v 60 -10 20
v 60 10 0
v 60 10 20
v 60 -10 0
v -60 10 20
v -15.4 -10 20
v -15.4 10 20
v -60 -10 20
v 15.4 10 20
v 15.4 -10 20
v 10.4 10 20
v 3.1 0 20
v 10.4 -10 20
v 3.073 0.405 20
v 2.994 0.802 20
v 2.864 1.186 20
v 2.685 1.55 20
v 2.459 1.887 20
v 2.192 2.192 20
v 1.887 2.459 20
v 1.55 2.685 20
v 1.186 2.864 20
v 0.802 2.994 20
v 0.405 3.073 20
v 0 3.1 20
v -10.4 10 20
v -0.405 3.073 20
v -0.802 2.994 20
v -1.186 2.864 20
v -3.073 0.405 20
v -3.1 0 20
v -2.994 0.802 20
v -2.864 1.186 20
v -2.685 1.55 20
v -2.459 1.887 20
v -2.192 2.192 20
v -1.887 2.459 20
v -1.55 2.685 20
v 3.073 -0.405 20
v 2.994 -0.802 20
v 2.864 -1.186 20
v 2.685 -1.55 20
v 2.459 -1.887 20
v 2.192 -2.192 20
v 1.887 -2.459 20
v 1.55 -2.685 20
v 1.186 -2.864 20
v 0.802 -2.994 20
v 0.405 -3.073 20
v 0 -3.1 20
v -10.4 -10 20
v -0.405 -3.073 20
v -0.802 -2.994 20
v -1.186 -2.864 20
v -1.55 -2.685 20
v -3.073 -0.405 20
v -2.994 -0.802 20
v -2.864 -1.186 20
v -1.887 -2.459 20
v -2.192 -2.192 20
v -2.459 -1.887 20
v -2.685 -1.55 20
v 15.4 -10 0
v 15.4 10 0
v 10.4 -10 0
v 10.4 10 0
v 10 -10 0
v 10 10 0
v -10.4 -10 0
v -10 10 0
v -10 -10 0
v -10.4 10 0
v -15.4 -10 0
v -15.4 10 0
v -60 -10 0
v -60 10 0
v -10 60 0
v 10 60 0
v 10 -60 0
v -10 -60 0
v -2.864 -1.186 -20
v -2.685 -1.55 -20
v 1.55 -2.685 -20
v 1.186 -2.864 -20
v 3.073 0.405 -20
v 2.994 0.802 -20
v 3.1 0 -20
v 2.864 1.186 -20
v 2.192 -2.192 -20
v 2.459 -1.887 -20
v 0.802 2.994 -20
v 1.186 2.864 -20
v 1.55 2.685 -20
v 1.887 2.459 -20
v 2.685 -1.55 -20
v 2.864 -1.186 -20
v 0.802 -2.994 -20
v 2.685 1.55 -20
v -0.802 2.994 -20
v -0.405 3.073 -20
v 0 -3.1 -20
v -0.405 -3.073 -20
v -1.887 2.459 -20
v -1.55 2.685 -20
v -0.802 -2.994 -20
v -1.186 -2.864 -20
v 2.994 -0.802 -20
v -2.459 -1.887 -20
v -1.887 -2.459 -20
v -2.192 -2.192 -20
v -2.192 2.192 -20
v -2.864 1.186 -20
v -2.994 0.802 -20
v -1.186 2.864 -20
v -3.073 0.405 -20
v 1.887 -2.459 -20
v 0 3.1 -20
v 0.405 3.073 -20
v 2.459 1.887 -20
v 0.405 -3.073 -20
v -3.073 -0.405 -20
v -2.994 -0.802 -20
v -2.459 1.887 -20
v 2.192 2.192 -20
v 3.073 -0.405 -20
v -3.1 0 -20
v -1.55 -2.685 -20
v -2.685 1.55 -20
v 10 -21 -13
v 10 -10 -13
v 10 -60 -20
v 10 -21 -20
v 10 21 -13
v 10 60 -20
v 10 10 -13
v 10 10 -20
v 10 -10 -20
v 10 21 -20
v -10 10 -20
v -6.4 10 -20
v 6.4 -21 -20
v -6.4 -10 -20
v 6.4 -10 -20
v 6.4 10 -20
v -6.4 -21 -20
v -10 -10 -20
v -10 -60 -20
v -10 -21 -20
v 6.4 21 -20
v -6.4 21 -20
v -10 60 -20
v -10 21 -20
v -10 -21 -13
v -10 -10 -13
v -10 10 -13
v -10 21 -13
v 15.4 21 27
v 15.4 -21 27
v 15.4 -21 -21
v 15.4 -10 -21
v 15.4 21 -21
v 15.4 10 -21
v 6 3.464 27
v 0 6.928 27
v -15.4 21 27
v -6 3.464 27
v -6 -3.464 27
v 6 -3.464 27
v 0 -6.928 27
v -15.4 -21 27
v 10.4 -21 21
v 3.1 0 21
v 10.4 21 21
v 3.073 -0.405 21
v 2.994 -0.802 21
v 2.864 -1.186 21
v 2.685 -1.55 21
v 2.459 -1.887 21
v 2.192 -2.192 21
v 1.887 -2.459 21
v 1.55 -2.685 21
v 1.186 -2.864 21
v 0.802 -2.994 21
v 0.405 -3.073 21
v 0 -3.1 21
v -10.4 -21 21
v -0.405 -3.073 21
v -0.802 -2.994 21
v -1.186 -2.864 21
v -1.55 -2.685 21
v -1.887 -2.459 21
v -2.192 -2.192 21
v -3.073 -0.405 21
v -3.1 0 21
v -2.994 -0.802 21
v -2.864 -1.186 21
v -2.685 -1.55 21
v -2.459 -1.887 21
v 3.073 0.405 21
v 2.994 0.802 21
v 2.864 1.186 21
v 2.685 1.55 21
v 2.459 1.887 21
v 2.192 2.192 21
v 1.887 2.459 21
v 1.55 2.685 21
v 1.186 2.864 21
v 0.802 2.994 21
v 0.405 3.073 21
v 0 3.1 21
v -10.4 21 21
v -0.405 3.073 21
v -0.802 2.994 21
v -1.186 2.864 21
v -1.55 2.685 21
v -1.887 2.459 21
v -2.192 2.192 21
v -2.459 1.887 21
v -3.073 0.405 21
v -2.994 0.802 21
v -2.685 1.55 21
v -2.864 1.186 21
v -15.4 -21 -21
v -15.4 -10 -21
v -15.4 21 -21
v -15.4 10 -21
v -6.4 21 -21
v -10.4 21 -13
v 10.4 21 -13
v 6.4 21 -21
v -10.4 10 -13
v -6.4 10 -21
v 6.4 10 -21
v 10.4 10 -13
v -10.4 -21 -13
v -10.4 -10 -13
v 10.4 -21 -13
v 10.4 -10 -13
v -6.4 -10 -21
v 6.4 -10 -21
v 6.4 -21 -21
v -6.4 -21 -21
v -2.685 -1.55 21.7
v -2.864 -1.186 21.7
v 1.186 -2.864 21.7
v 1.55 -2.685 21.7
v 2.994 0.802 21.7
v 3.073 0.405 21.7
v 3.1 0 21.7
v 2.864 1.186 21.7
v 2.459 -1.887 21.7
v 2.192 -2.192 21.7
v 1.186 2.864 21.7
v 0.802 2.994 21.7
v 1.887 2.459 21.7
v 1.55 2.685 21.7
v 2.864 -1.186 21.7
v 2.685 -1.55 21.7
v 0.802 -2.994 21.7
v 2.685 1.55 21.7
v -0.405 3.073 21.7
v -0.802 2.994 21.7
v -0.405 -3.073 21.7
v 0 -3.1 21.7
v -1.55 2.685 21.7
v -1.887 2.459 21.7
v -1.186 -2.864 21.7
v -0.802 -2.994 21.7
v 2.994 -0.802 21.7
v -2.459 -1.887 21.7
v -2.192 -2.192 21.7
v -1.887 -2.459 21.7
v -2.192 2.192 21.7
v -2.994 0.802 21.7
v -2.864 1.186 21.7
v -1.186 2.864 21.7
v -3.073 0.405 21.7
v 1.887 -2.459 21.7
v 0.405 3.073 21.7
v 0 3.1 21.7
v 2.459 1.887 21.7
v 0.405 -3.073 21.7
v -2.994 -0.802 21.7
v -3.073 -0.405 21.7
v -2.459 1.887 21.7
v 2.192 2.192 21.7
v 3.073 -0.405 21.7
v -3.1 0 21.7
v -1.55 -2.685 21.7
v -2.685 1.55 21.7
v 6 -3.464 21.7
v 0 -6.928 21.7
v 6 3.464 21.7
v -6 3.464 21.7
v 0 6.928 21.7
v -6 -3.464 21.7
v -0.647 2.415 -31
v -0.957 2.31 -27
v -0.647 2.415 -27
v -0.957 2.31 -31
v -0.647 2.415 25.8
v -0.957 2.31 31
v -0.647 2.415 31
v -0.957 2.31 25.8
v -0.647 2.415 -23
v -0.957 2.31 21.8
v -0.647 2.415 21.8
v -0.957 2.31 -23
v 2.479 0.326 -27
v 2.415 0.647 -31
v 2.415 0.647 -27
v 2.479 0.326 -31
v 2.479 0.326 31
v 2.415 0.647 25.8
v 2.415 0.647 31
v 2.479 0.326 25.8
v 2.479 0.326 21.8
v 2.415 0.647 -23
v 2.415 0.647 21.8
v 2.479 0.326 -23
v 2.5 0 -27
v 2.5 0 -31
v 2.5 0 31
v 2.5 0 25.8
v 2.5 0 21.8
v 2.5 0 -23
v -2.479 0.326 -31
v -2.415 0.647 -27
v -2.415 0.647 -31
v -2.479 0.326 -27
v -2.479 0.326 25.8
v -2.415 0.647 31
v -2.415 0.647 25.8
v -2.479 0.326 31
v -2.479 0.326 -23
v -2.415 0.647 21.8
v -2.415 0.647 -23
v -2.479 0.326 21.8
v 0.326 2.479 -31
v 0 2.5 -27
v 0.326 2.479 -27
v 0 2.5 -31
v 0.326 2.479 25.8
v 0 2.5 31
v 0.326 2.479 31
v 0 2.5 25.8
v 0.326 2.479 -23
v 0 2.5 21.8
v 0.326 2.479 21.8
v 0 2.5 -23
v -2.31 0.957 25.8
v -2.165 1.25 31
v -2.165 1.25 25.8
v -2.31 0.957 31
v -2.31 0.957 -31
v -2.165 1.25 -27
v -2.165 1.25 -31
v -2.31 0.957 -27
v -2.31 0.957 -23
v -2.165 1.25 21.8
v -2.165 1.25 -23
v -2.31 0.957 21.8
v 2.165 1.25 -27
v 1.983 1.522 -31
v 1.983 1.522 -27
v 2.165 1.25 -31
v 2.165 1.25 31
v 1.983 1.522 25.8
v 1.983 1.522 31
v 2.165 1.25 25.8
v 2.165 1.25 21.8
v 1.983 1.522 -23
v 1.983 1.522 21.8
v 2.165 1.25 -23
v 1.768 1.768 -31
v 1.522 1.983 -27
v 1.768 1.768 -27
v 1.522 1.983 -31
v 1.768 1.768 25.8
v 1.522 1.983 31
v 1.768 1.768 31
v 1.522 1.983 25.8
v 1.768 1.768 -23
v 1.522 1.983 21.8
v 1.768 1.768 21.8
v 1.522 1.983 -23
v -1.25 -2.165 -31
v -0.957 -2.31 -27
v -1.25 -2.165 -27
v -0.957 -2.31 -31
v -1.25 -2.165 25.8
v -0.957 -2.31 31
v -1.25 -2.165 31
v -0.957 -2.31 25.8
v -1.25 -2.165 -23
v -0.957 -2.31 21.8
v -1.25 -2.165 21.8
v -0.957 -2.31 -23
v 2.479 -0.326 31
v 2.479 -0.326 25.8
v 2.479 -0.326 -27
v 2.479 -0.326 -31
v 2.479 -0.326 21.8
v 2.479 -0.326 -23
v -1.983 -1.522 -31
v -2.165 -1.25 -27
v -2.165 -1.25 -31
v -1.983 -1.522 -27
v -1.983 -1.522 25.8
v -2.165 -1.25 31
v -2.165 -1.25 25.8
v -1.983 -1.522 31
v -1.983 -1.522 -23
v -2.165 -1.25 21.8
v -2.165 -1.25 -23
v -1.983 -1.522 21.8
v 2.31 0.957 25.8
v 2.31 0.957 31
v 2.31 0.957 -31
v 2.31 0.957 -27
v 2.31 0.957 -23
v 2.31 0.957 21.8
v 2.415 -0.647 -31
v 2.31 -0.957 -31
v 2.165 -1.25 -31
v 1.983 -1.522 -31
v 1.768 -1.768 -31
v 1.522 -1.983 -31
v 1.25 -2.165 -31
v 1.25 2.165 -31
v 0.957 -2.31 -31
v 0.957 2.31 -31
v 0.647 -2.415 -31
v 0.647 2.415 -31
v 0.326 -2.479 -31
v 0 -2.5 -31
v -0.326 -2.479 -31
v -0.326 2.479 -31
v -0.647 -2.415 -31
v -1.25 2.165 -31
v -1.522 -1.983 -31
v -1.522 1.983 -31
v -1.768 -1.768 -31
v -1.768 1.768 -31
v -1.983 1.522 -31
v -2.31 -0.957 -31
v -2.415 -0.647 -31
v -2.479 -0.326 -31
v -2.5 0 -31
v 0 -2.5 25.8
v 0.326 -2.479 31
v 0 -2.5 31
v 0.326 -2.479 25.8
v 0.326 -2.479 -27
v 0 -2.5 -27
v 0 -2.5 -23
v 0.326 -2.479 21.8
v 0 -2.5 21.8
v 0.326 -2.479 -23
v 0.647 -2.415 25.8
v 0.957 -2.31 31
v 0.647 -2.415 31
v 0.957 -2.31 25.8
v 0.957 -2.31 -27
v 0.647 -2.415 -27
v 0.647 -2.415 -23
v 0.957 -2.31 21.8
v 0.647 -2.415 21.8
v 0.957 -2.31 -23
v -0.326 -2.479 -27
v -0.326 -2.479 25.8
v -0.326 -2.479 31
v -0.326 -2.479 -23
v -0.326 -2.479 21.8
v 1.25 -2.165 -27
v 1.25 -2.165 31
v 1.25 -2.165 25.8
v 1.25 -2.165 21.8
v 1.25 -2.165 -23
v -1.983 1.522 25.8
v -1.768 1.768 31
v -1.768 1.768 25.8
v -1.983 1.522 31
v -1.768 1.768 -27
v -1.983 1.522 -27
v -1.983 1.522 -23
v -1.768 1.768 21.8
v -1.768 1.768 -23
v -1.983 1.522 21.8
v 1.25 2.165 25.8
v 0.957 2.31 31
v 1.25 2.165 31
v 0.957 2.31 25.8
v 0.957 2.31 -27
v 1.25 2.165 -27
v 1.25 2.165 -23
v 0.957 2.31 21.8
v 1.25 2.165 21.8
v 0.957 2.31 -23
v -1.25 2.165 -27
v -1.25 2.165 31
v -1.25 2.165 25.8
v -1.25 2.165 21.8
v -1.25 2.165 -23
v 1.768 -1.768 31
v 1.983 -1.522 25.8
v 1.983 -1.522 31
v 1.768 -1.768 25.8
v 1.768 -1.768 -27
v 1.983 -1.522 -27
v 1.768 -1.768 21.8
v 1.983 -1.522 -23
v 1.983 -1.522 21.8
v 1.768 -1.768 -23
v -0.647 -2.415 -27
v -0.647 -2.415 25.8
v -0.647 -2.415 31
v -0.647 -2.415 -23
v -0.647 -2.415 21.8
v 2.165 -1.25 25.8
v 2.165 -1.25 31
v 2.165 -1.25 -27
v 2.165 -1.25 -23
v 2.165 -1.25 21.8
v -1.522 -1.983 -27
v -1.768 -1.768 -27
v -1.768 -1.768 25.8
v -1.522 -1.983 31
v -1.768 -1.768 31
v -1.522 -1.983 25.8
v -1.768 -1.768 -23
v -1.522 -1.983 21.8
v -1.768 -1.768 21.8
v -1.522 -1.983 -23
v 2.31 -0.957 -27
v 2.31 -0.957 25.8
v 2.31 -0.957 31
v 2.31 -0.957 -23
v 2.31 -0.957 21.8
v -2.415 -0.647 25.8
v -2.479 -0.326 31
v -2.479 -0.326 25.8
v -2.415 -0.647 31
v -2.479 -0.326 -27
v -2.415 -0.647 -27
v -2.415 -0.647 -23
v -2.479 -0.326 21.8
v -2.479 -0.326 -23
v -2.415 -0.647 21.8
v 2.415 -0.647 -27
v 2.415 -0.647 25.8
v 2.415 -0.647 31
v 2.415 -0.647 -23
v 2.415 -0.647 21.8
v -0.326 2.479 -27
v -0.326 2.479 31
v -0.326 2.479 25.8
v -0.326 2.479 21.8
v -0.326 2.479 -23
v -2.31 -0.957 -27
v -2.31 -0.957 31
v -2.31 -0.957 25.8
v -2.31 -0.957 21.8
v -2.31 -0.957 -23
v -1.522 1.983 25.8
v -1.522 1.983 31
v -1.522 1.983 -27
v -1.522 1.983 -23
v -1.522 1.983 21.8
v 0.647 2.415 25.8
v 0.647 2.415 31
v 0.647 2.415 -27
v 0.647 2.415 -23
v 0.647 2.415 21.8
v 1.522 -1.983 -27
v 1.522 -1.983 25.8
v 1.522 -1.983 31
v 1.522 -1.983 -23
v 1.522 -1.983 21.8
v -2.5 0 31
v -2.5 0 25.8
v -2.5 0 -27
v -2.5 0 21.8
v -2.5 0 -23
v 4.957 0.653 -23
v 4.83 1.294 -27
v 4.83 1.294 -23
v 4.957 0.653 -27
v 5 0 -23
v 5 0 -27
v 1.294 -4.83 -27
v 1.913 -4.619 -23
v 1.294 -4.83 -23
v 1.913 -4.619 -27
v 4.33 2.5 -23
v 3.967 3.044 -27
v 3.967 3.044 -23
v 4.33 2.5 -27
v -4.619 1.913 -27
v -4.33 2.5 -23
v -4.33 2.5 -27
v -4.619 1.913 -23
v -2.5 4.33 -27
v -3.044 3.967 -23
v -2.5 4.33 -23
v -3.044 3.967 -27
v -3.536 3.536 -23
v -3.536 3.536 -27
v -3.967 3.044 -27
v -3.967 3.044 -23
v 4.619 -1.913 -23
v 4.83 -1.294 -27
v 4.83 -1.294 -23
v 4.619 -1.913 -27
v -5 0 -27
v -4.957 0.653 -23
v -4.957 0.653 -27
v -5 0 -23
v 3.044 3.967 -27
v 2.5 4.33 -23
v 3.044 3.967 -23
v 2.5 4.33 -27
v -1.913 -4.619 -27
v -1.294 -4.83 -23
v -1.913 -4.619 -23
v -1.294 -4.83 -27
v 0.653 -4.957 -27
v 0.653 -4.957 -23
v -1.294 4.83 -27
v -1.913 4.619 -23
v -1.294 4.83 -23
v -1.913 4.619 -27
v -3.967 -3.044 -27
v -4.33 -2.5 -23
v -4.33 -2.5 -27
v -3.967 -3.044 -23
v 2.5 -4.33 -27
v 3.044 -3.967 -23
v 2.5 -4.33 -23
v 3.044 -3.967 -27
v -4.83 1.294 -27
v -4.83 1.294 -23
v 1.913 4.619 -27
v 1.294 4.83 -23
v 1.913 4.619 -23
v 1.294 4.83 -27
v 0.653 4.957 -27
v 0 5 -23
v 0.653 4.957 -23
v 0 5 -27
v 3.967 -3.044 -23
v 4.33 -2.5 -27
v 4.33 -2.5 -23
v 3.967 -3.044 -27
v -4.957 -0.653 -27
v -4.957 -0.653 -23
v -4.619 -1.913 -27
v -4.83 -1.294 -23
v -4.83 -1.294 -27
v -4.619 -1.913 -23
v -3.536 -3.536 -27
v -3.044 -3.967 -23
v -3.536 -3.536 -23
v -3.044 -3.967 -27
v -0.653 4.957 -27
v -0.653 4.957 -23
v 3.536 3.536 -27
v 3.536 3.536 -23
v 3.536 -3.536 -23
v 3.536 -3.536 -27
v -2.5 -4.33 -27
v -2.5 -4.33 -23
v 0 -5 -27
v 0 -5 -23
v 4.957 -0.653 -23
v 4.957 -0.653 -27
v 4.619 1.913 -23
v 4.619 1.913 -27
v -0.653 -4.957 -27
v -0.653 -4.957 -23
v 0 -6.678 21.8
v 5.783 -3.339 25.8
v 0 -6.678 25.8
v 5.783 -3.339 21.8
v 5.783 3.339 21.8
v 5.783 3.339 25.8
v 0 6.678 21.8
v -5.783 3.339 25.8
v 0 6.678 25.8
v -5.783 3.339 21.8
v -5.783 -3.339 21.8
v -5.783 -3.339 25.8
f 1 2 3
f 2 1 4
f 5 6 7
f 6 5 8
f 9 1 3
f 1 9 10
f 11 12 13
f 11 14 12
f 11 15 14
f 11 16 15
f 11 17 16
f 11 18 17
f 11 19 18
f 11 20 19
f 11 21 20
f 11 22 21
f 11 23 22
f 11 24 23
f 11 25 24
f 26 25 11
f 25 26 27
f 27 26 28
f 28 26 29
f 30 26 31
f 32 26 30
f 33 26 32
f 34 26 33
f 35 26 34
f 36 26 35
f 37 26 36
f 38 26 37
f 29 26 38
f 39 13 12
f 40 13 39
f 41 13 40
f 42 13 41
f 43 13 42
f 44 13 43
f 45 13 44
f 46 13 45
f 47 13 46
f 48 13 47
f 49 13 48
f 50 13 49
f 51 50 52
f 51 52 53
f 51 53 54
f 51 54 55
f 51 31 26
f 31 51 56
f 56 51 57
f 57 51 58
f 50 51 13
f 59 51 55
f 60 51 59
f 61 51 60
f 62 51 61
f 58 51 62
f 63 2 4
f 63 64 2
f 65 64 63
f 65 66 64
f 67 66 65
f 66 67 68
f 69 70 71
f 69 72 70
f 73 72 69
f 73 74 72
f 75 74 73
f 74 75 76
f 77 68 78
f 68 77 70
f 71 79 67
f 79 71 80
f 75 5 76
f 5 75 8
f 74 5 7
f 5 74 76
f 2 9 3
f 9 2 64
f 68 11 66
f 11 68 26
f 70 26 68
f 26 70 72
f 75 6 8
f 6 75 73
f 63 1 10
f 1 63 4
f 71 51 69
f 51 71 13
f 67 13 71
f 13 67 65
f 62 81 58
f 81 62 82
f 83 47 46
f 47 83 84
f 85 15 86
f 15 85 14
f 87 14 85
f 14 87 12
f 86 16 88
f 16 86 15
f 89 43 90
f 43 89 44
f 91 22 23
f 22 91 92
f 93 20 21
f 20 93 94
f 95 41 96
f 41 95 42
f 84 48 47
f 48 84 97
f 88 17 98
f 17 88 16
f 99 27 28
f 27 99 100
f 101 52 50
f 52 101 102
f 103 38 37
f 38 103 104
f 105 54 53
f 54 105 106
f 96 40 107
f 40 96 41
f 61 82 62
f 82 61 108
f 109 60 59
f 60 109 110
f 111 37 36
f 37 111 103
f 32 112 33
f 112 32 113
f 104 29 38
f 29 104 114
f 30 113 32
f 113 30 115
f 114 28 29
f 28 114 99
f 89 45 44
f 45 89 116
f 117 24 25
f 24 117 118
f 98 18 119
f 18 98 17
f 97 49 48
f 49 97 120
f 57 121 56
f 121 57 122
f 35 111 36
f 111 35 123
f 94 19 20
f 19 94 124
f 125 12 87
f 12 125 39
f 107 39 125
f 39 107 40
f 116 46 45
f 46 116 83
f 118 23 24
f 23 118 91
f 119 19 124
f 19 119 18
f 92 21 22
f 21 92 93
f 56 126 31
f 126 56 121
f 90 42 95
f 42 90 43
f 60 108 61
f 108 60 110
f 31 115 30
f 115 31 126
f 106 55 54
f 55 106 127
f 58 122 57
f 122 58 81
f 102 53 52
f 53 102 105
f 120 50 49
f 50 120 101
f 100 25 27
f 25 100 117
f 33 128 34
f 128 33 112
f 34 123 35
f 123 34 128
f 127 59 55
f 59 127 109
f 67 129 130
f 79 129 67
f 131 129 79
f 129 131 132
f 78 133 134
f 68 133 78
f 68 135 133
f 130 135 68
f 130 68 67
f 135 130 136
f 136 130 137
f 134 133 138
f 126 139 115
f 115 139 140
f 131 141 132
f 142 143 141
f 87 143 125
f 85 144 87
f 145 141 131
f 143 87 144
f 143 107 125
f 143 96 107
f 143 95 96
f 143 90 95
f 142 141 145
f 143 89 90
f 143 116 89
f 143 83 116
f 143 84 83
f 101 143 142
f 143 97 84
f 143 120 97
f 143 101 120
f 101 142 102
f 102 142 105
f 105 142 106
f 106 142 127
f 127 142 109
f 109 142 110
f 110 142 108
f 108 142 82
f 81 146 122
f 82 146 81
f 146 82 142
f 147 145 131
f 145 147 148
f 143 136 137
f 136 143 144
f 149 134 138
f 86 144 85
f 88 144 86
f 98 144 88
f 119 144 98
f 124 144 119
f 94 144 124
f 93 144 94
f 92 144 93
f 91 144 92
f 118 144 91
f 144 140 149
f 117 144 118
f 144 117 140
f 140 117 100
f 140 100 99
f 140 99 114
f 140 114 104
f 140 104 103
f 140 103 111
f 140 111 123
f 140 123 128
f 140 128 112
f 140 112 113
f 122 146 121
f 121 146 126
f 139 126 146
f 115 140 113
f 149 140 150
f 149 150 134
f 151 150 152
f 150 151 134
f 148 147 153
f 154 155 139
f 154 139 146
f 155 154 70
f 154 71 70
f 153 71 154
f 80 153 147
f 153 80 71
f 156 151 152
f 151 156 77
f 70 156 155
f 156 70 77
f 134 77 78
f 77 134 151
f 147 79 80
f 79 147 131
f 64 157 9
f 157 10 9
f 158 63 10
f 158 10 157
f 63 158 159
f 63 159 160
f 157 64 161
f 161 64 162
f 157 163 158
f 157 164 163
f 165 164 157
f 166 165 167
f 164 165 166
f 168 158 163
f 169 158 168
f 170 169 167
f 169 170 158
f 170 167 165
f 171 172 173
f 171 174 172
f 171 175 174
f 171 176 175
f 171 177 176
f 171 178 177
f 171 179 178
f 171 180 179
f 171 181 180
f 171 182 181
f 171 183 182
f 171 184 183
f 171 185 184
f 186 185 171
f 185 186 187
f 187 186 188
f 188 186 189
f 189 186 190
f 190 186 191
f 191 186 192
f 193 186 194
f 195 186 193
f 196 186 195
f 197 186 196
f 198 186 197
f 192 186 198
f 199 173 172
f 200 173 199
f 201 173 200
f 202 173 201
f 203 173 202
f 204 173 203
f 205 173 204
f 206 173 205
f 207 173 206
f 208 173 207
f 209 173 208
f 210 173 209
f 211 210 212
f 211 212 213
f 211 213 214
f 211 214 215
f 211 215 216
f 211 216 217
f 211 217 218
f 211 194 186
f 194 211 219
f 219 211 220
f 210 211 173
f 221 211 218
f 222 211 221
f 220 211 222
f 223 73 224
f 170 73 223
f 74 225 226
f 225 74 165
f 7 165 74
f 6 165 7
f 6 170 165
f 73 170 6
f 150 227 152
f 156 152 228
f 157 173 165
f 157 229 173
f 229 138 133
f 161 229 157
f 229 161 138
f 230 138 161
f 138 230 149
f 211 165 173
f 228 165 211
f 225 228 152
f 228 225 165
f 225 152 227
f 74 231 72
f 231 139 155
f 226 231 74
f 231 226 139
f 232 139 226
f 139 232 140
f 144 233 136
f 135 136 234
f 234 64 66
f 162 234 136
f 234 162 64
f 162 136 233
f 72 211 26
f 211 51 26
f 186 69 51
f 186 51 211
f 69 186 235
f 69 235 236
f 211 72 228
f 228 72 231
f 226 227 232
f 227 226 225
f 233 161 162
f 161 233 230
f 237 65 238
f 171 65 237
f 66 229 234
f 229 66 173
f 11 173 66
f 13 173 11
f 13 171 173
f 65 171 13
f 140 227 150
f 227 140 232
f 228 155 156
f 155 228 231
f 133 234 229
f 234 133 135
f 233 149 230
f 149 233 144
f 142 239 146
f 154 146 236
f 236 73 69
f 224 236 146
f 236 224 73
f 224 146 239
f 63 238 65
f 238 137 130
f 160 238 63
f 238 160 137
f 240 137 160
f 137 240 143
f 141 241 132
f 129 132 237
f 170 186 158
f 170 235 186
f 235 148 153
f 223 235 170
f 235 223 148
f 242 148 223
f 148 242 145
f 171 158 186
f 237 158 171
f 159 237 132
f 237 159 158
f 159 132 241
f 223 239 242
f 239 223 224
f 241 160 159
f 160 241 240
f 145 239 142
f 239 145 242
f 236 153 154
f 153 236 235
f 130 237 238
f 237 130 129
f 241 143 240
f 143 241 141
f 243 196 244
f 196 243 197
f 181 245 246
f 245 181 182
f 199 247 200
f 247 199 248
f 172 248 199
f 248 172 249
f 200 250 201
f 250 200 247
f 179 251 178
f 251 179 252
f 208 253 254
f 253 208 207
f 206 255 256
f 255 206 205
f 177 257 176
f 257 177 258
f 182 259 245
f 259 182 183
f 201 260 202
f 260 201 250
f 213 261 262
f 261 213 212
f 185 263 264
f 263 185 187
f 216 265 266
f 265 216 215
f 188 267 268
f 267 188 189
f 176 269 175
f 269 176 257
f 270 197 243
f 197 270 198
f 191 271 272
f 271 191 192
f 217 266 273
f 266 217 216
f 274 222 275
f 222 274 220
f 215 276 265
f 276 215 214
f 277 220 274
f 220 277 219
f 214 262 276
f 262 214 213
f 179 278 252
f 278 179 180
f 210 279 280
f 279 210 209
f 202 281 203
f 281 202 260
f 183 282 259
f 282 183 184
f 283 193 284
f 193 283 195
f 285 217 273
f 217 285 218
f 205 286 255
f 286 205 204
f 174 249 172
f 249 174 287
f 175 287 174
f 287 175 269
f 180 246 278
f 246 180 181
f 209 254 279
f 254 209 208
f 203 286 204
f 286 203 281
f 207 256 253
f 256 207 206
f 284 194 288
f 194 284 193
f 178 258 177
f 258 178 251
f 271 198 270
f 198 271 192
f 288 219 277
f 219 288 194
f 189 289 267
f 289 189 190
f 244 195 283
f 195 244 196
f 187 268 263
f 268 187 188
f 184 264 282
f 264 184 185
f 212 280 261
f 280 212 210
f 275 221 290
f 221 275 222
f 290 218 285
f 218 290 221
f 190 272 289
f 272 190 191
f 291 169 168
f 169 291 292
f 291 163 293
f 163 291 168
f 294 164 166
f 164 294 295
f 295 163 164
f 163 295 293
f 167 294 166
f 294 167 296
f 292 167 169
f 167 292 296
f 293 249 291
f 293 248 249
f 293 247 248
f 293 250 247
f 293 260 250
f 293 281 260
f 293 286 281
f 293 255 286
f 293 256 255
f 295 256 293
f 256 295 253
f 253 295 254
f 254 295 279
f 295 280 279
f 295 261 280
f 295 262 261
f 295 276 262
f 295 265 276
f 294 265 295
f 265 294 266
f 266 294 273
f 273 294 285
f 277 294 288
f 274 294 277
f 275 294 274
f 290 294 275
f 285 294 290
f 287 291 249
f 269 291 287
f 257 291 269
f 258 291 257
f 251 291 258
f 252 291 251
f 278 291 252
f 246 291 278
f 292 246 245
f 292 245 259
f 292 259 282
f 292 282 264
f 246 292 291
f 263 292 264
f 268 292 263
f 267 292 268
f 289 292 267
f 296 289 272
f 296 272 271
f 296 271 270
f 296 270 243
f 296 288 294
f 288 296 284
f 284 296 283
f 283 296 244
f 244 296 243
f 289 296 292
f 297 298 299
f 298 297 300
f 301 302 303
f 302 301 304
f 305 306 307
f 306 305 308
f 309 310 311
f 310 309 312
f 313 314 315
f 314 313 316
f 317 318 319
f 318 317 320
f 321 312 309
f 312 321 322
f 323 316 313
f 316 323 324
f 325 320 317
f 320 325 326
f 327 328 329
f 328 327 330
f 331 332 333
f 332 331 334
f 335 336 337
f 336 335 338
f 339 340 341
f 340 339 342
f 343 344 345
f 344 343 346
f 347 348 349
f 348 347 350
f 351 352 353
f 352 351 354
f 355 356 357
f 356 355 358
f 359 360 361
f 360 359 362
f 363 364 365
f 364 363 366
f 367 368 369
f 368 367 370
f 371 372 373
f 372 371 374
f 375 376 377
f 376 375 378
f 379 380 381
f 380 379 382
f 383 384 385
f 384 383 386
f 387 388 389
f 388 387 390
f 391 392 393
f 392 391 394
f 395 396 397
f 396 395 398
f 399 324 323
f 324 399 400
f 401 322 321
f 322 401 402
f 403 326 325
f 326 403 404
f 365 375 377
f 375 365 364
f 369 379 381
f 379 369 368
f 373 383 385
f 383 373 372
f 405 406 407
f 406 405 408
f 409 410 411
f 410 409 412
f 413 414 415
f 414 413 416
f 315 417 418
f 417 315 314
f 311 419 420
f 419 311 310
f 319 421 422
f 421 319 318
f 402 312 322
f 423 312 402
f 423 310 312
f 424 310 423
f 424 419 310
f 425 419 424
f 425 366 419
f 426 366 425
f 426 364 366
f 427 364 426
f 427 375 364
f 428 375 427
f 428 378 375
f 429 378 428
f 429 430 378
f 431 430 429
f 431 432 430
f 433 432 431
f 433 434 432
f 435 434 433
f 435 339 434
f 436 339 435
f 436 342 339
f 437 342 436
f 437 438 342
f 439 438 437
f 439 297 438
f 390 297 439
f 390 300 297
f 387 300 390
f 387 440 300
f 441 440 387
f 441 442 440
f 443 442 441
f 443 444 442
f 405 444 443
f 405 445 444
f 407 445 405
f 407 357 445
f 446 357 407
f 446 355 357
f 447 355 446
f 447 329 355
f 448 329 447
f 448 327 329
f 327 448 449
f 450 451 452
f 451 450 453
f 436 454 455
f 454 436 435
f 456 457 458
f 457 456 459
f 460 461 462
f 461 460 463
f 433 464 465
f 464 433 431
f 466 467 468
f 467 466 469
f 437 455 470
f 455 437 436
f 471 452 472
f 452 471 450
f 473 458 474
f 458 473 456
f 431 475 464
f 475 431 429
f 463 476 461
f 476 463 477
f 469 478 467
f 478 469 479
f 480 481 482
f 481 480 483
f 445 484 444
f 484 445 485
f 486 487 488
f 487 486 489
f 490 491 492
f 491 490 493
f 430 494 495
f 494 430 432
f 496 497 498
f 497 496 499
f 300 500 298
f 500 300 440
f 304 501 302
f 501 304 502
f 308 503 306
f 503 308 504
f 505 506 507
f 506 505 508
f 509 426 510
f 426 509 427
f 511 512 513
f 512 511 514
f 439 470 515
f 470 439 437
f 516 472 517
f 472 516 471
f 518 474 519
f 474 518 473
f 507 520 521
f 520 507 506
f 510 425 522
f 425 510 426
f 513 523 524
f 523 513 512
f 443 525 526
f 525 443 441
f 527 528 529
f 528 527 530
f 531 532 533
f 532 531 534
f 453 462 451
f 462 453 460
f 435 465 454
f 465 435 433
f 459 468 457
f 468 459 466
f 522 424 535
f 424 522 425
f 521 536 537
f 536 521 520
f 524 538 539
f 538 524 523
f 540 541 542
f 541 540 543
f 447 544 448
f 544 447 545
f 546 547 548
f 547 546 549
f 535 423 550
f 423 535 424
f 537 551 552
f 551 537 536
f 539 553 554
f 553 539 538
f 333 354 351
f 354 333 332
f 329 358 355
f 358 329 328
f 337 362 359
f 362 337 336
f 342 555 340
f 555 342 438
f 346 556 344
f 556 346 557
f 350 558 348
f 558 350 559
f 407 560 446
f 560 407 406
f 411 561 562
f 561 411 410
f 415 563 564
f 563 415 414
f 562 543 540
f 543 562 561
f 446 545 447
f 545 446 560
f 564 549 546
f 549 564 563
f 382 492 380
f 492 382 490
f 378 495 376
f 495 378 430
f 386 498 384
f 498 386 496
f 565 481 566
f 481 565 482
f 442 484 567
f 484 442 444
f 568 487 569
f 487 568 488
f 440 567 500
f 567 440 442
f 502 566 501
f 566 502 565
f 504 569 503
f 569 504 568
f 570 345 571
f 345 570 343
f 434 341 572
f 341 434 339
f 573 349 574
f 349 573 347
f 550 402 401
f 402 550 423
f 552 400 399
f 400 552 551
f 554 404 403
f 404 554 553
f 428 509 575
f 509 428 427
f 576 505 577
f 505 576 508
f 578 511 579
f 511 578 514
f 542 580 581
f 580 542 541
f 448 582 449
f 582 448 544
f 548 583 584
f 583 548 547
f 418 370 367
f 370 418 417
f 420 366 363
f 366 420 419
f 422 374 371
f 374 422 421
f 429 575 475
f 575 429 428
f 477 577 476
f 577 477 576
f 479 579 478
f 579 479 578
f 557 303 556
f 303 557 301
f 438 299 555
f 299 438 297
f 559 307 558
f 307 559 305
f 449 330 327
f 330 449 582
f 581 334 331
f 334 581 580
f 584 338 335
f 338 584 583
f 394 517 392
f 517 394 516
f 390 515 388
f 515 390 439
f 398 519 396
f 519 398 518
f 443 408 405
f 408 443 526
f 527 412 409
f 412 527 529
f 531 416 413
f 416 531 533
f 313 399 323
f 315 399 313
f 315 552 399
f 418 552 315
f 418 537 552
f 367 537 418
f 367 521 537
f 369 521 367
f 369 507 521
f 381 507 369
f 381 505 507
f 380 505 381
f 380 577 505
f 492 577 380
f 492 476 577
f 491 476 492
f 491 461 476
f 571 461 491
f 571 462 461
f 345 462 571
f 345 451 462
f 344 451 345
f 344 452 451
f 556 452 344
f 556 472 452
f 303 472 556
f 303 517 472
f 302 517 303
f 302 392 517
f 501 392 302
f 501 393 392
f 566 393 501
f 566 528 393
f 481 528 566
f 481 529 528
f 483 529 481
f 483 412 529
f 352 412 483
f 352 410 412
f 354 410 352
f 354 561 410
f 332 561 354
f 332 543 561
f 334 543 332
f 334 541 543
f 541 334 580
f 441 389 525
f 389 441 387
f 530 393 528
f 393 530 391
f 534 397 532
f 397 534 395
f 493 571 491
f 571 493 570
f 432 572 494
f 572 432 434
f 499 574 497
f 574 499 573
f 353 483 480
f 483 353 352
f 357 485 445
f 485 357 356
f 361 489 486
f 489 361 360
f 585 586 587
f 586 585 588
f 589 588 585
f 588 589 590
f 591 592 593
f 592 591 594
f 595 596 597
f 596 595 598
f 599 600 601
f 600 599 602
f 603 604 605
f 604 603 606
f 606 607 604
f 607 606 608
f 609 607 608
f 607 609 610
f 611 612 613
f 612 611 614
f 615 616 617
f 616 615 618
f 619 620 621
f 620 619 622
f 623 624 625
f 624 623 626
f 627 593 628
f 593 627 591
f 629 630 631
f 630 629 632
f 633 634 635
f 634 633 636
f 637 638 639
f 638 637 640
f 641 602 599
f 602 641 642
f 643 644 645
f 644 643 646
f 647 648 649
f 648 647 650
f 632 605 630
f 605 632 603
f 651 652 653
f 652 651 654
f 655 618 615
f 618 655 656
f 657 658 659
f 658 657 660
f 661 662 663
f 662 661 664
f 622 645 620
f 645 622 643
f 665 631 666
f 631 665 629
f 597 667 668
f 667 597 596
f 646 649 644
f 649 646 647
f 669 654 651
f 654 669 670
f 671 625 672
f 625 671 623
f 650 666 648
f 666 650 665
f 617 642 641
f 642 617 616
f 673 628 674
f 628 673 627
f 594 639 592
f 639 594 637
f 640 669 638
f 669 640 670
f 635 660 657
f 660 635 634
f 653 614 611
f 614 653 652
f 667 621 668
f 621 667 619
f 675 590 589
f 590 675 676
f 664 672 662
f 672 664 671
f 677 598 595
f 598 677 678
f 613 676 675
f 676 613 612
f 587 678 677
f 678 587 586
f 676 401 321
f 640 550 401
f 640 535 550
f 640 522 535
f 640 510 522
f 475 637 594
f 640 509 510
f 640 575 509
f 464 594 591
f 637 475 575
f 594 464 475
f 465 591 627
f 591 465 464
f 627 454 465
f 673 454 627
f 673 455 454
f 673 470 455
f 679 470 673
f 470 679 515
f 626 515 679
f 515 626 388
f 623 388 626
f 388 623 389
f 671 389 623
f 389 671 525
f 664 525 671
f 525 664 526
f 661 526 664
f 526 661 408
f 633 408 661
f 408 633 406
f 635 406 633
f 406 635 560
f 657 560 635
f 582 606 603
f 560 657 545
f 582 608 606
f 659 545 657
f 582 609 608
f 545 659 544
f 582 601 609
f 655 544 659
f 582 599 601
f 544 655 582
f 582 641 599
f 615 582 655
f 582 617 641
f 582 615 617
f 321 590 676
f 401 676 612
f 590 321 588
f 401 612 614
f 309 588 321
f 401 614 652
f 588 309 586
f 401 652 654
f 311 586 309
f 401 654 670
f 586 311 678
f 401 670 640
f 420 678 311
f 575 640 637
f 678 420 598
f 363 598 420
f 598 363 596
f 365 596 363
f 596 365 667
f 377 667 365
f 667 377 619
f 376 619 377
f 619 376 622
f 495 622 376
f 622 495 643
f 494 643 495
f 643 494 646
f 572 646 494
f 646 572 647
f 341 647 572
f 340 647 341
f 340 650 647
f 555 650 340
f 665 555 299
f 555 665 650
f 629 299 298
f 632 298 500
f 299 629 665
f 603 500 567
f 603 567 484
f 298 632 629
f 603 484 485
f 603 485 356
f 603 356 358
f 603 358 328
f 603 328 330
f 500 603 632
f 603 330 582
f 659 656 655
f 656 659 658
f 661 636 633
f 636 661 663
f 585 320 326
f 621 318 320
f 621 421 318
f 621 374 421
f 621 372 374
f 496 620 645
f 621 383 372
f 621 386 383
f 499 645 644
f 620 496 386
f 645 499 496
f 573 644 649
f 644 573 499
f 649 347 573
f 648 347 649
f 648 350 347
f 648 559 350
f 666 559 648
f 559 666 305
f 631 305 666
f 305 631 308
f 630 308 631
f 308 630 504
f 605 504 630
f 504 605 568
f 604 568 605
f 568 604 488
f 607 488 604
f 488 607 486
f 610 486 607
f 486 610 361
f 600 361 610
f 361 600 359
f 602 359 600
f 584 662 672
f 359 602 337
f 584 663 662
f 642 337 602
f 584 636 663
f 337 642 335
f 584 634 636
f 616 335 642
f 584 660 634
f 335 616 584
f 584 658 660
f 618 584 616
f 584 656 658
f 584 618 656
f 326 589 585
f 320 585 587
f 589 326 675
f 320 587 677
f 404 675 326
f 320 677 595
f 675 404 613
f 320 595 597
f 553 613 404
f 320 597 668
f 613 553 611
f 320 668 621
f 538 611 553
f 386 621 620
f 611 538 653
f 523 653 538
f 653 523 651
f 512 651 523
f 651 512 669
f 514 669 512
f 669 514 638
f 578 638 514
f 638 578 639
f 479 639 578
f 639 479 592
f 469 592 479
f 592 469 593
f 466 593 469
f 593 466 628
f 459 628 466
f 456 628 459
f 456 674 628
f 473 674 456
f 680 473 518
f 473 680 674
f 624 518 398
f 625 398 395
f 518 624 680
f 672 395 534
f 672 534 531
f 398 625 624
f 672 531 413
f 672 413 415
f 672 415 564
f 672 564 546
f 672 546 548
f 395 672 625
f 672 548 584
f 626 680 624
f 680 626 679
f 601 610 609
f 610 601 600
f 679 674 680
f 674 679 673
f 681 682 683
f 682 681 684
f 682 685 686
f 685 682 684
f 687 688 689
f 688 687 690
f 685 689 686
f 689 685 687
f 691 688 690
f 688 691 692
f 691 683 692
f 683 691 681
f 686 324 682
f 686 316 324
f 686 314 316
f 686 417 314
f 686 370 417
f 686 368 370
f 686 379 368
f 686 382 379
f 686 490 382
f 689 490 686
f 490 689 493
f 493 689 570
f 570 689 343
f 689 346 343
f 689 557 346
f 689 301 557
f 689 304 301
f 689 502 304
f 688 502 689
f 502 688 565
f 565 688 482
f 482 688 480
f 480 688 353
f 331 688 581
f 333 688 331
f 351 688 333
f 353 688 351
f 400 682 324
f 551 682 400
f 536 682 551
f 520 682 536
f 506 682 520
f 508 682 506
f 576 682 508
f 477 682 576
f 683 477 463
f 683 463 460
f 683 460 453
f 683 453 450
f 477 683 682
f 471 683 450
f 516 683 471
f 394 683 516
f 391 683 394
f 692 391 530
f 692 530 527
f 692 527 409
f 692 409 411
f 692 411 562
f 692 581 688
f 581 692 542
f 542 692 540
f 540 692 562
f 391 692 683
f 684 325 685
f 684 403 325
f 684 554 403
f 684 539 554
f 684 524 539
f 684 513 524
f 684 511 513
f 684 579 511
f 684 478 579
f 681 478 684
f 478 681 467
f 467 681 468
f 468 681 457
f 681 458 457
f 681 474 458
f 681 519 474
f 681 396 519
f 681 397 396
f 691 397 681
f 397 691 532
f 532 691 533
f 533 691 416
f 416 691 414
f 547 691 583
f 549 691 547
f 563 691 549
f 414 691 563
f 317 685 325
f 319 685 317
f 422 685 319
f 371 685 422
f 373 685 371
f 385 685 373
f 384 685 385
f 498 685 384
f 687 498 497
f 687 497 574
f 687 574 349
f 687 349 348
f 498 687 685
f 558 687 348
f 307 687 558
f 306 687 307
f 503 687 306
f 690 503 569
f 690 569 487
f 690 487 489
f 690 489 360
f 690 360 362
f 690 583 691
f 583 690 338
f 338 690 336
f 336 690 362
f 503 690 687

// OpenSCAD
// Pingpang-SmartGear — one-piece double-U joint guard, v0.6
//
// Mechanical contract for this correction:
//   x = barrier long direction
//   y = front/back direction
//   z = vertical direction
//
// The printed part is ONE solid.  It contains a front U and a back U, joined
// by one printed top yoke.  The clear distance between the two U inner faces
// is exactly 20 mm.  There is no male/female printed connection and no second
// printed part to bolt together.
//
// The context tubes are the local joint envelope:
//   upper long 20x20 tube: axis x, z=0..20
//   lower perpendicular 20x20 tube: axis y, z=-20..0
// They touch at z=0 and share a vertical screw axis through their centre.

$fn = 48;

PART = "assembly_iso";

// ---------- fixed interface dimensions ----------
tube = 20;
u_inner_distance_y = 20;       // hard requirement: inner face to inner face
u_clearance_x = 0.8;           // only the x direction has initial PETG relief
u_inner_width_x = tube + u_clearance_x;
wall = 5.0;
u_outer_width_x = u_inner_width_x + 2 * wall;

front_y_inner = u_inner_distance_y / 2;
base_plate_depth_y = 7.0;
front_back_extension_y = 4.0;  // extend the complete U plate front-to-back
plate_depth_y = base_plate_depth_y + front_back_extension_y;
front_y_outer = front_y_inner + plate_depth_y;
back_y_outer = -front_y_outer;
back_y_inner = -front_y_inner;

foot_bottom_z = -tube;
below_foot_extension_z = 1.0;
u_bottom = foot_bottom_z - below_foot_extension_z;
u_top = 27;
top_yoke_thickness = 6.0;
hook_depth_x = 6.5;
hook_height_z = 8.0; // preserve the vertical抱脚 contact above the foot bottom
solid_upper_wall_bottom_z = 0.0; // solid side wall ends at the foot's upper edge

// Preview-only context: show the complete lower foot rather than a clipped
// 20 mm joint slice.  This does not change the printable part.
preview_foot_length_y = 120.0;

// Vertical screw relief.  This is a clearance hole, never a printed thread;
// the actual M4/M5 screw and nut/tapped tube remain external hardware.
screw_clearance_d = 6.2;

// Full top nut envelope.  The socket is intentionally larger than an M5 AF8
// nut and deeper than a typical 4 mm nut, so the nut cannot touch the top
// surface when the screw is tightened.
nut_pocket_af = 12.0;
nut_pocket_depth = 5.2;
nut_height = 4.0;

assert(u_inner_distance_y == 20, "双 U 内距离必须保持 20 mm");

// ---------- helpers ----------
module box_at(xc, yc, zc, sx, sy, sz) {
    translate([xc, yc, zc]) cube([sx, sy, sz], center = true);
}

module u_plate(y0, y1) {
    depth = y1 - y0;
    yc = (y0 + y1) / 2;
    left_x = -u_outer_width_x / 2 + wall / 2;
    right_x = u_outer_width_x / 2 - wall / 2;
    lip_z = u_bottom + hook_height_z / 2;
    left_lip_x = -u_outer_width_x / 2 + wall / 2 + hook_depth_x / 2;
    right_lip_x = u_outer_width_x / 2 - wall / 2 - hook_depth_x / 2;
    union() {
        // U top and two continuous arms.
        box_at(0, yc, u_top - top_yoke_thickness / 2,
               u_outer_width_x, depth, top_yoke_thickness);
        box_at(left_x, yc, (u_top + u_bottom) / 2,
               wall, depth, u_top - u_bottom);
        box_at(right_x, yc, (u_top + u_bottom) / 2,
               wall, depth, u_top - u_bottom);

        // Inward lower hooks: the actual anti-rotation retaining feature.
        box_at(left_lip_x, yc, lip_z,
               hook_depth_x, depth, hook_height_z);
        box_at(right_lip_x, yc, lip_z,
               hook_depth_x, depth, hook_height_z);

    }
}

module printed_yokes() {
    // The top yoke joins the top bridges of both U plates into one roof.
    // The lower mouths remain open so the front/back silhouettes stay U-shaped.
    box_at(0, 0, u_top - top_yoke_thickness / 2,
           u_outer_width_x, 2 * front_y_outer, top_yoke_thickness);
}

module solid_upper_side_walls() {
    // Above the foot, the left and right sides are continuous solid walls
    // through the full front/back depth.  The lower foot region remains open
    // except for the front/back U arms and inward retaining hooks.
    left_x = -u_outer_width_x / 2 + wall / 2;
    right_x = u_outer_width_x / 2 - wall / 2;
    wall_height = u_top - solid_upper_wall_bottom_z;

    box_at(left_x, 0, solid_upper_wall_bottom_z + wall_height / 2,
           wall, 2 * front_y_outer, wall_height);
    box_at(right_x, 0, solid_upper_wall_bottom_z + wall_height / 2,
           wall, 2 * front_y_outer, wall_height);
}

module vertical_screw_relief() {
    // Full z-axis clearance through the printed top yoke.  There is no printed
    // material in the middle gap, so this does not create a hidden horizontal
    // tunnel or a self-intersecting connector.  The screw approaches from
    // below, passes through the two tube sections, and exits this top yoke.
    translate([0, 0, (u_bottom + u_top) / 2])
        cylinder(d = screw_clearance_d,
                 h = (u_top - u_bottom) + 8,
                 center = true);

    // Hexagonal pocket opens from the top face.  Across-flats clearance is
    // deliberately generous; the remaining floor keeps the nut captured.
    translate([0, 0, u_top - nut_pocket_depth / 2])
        rotate([0, 0, 30])
            cylinder(r = nut_pocket_af / (2 * cos(30)),
                     h = nut_pocket_depth + 0.2,
                     center = true,
                     $fn = 6);
}

module double_u_clip() {
    difference() {
        union() {
            // Front U: inner face y=+10, outer face y=+21.
            u_plate(front_y_inner, front_y_outer);

            // Back U: inner face y=-10, outer face y=-21.
            u_plate(back_y_outer, back_y_inner);

            printed_yokes();
            solid_upper_side_walls();
        }
        vertical_screw_relief();
    }
}

// ---------- context envelope for preview only ----------
module vertical_bore() {
    translate([0, 0, 0])
        cylinder(d = screw_clearance_d, h = 60, center = true);
}

module upper_long_tube() {
    color([0.58, 0.61, 0.66])
        difference() {
            translate([0, 0, tube / 2])
                cube([120, tube, tube], center = true);
            vertical_bore();
        }
}

module lower_cross_tube() {
    // Preview the complete lower foot along y.  The printable interface still
    // uses the exact 20 mm gap between the two U inner faces.
    color([0.28, 0.45, 0.78])
        difference() {
            translate([0, 0, -tube / 2])
                cube([tube, preview_foot_length_y, tube], center = true);
            vertical_bore();
        }
}

module vertical_joint_screw() {
    color([0.82, 0.82, 0.84])
        translate([0, 0, 0])
            cylinder(d = 5.0, h = 62, center = true);

    // Screw head below the lower yoke.
    color([0.92, 0.70, 0.12])
        translate([0, 0, u_bottom - 4])
            cylinder(d = 10.0, h = 4.0, center = true);

    // The nut sits inside the recessed top pocket, below the top surface.
    color([0.92, 0.70, 0.12])
        translate([0, 0, u_top - nut_pocket_depth + nut_height / 2])
            rotate([0, 0, 30])
                cylinder(r = nut_pocket_af / (2 * cos(30)) - 0.25,
                         h = nut_height,
                         center = true,
                         $fn = 6);
}

module assembly_iso() {
    upper_long_tube();
    lower_cross_tube();
    color([0.96, 0.39, 0.08]) double_u_clip();
    vertical_joint_screw();
}

module assembly_section() {
    // Cut the positive-x half to expose the vertical hole and the 20 mm gap.
    intersection() {
        assembly_iso();
        translate([0, -100, -100]) cube([100, 200, 200]);
    }
}

module clip_front() {
    double_u_clip();
}

module clip_bottom() {
    double_u_clip();
}

module clip_top() {
    double_u_clip();
}

module clip_print_orientation() {
    // One-piece print orientation.  The y envelope is placed on z=0.
    translate([0, 0, front_y_outer])
        rotate([90, 0, 0]) double_u_clip();
}

if (PART == "clip") {
    double_u_clip();
} else if (PART == "clip_print_orientation") {
    clip_print_orientation();
} else if (PART == "assembly_section") {
    assembly_section();
} else if (PART == "clip_front") {
    clip_front();
} else if (PART == "clip_bottom") {
    clip_bottom();
} else if (PART == "clip_top") {
    clip_top();
} else {
    assembly_iso();
}
